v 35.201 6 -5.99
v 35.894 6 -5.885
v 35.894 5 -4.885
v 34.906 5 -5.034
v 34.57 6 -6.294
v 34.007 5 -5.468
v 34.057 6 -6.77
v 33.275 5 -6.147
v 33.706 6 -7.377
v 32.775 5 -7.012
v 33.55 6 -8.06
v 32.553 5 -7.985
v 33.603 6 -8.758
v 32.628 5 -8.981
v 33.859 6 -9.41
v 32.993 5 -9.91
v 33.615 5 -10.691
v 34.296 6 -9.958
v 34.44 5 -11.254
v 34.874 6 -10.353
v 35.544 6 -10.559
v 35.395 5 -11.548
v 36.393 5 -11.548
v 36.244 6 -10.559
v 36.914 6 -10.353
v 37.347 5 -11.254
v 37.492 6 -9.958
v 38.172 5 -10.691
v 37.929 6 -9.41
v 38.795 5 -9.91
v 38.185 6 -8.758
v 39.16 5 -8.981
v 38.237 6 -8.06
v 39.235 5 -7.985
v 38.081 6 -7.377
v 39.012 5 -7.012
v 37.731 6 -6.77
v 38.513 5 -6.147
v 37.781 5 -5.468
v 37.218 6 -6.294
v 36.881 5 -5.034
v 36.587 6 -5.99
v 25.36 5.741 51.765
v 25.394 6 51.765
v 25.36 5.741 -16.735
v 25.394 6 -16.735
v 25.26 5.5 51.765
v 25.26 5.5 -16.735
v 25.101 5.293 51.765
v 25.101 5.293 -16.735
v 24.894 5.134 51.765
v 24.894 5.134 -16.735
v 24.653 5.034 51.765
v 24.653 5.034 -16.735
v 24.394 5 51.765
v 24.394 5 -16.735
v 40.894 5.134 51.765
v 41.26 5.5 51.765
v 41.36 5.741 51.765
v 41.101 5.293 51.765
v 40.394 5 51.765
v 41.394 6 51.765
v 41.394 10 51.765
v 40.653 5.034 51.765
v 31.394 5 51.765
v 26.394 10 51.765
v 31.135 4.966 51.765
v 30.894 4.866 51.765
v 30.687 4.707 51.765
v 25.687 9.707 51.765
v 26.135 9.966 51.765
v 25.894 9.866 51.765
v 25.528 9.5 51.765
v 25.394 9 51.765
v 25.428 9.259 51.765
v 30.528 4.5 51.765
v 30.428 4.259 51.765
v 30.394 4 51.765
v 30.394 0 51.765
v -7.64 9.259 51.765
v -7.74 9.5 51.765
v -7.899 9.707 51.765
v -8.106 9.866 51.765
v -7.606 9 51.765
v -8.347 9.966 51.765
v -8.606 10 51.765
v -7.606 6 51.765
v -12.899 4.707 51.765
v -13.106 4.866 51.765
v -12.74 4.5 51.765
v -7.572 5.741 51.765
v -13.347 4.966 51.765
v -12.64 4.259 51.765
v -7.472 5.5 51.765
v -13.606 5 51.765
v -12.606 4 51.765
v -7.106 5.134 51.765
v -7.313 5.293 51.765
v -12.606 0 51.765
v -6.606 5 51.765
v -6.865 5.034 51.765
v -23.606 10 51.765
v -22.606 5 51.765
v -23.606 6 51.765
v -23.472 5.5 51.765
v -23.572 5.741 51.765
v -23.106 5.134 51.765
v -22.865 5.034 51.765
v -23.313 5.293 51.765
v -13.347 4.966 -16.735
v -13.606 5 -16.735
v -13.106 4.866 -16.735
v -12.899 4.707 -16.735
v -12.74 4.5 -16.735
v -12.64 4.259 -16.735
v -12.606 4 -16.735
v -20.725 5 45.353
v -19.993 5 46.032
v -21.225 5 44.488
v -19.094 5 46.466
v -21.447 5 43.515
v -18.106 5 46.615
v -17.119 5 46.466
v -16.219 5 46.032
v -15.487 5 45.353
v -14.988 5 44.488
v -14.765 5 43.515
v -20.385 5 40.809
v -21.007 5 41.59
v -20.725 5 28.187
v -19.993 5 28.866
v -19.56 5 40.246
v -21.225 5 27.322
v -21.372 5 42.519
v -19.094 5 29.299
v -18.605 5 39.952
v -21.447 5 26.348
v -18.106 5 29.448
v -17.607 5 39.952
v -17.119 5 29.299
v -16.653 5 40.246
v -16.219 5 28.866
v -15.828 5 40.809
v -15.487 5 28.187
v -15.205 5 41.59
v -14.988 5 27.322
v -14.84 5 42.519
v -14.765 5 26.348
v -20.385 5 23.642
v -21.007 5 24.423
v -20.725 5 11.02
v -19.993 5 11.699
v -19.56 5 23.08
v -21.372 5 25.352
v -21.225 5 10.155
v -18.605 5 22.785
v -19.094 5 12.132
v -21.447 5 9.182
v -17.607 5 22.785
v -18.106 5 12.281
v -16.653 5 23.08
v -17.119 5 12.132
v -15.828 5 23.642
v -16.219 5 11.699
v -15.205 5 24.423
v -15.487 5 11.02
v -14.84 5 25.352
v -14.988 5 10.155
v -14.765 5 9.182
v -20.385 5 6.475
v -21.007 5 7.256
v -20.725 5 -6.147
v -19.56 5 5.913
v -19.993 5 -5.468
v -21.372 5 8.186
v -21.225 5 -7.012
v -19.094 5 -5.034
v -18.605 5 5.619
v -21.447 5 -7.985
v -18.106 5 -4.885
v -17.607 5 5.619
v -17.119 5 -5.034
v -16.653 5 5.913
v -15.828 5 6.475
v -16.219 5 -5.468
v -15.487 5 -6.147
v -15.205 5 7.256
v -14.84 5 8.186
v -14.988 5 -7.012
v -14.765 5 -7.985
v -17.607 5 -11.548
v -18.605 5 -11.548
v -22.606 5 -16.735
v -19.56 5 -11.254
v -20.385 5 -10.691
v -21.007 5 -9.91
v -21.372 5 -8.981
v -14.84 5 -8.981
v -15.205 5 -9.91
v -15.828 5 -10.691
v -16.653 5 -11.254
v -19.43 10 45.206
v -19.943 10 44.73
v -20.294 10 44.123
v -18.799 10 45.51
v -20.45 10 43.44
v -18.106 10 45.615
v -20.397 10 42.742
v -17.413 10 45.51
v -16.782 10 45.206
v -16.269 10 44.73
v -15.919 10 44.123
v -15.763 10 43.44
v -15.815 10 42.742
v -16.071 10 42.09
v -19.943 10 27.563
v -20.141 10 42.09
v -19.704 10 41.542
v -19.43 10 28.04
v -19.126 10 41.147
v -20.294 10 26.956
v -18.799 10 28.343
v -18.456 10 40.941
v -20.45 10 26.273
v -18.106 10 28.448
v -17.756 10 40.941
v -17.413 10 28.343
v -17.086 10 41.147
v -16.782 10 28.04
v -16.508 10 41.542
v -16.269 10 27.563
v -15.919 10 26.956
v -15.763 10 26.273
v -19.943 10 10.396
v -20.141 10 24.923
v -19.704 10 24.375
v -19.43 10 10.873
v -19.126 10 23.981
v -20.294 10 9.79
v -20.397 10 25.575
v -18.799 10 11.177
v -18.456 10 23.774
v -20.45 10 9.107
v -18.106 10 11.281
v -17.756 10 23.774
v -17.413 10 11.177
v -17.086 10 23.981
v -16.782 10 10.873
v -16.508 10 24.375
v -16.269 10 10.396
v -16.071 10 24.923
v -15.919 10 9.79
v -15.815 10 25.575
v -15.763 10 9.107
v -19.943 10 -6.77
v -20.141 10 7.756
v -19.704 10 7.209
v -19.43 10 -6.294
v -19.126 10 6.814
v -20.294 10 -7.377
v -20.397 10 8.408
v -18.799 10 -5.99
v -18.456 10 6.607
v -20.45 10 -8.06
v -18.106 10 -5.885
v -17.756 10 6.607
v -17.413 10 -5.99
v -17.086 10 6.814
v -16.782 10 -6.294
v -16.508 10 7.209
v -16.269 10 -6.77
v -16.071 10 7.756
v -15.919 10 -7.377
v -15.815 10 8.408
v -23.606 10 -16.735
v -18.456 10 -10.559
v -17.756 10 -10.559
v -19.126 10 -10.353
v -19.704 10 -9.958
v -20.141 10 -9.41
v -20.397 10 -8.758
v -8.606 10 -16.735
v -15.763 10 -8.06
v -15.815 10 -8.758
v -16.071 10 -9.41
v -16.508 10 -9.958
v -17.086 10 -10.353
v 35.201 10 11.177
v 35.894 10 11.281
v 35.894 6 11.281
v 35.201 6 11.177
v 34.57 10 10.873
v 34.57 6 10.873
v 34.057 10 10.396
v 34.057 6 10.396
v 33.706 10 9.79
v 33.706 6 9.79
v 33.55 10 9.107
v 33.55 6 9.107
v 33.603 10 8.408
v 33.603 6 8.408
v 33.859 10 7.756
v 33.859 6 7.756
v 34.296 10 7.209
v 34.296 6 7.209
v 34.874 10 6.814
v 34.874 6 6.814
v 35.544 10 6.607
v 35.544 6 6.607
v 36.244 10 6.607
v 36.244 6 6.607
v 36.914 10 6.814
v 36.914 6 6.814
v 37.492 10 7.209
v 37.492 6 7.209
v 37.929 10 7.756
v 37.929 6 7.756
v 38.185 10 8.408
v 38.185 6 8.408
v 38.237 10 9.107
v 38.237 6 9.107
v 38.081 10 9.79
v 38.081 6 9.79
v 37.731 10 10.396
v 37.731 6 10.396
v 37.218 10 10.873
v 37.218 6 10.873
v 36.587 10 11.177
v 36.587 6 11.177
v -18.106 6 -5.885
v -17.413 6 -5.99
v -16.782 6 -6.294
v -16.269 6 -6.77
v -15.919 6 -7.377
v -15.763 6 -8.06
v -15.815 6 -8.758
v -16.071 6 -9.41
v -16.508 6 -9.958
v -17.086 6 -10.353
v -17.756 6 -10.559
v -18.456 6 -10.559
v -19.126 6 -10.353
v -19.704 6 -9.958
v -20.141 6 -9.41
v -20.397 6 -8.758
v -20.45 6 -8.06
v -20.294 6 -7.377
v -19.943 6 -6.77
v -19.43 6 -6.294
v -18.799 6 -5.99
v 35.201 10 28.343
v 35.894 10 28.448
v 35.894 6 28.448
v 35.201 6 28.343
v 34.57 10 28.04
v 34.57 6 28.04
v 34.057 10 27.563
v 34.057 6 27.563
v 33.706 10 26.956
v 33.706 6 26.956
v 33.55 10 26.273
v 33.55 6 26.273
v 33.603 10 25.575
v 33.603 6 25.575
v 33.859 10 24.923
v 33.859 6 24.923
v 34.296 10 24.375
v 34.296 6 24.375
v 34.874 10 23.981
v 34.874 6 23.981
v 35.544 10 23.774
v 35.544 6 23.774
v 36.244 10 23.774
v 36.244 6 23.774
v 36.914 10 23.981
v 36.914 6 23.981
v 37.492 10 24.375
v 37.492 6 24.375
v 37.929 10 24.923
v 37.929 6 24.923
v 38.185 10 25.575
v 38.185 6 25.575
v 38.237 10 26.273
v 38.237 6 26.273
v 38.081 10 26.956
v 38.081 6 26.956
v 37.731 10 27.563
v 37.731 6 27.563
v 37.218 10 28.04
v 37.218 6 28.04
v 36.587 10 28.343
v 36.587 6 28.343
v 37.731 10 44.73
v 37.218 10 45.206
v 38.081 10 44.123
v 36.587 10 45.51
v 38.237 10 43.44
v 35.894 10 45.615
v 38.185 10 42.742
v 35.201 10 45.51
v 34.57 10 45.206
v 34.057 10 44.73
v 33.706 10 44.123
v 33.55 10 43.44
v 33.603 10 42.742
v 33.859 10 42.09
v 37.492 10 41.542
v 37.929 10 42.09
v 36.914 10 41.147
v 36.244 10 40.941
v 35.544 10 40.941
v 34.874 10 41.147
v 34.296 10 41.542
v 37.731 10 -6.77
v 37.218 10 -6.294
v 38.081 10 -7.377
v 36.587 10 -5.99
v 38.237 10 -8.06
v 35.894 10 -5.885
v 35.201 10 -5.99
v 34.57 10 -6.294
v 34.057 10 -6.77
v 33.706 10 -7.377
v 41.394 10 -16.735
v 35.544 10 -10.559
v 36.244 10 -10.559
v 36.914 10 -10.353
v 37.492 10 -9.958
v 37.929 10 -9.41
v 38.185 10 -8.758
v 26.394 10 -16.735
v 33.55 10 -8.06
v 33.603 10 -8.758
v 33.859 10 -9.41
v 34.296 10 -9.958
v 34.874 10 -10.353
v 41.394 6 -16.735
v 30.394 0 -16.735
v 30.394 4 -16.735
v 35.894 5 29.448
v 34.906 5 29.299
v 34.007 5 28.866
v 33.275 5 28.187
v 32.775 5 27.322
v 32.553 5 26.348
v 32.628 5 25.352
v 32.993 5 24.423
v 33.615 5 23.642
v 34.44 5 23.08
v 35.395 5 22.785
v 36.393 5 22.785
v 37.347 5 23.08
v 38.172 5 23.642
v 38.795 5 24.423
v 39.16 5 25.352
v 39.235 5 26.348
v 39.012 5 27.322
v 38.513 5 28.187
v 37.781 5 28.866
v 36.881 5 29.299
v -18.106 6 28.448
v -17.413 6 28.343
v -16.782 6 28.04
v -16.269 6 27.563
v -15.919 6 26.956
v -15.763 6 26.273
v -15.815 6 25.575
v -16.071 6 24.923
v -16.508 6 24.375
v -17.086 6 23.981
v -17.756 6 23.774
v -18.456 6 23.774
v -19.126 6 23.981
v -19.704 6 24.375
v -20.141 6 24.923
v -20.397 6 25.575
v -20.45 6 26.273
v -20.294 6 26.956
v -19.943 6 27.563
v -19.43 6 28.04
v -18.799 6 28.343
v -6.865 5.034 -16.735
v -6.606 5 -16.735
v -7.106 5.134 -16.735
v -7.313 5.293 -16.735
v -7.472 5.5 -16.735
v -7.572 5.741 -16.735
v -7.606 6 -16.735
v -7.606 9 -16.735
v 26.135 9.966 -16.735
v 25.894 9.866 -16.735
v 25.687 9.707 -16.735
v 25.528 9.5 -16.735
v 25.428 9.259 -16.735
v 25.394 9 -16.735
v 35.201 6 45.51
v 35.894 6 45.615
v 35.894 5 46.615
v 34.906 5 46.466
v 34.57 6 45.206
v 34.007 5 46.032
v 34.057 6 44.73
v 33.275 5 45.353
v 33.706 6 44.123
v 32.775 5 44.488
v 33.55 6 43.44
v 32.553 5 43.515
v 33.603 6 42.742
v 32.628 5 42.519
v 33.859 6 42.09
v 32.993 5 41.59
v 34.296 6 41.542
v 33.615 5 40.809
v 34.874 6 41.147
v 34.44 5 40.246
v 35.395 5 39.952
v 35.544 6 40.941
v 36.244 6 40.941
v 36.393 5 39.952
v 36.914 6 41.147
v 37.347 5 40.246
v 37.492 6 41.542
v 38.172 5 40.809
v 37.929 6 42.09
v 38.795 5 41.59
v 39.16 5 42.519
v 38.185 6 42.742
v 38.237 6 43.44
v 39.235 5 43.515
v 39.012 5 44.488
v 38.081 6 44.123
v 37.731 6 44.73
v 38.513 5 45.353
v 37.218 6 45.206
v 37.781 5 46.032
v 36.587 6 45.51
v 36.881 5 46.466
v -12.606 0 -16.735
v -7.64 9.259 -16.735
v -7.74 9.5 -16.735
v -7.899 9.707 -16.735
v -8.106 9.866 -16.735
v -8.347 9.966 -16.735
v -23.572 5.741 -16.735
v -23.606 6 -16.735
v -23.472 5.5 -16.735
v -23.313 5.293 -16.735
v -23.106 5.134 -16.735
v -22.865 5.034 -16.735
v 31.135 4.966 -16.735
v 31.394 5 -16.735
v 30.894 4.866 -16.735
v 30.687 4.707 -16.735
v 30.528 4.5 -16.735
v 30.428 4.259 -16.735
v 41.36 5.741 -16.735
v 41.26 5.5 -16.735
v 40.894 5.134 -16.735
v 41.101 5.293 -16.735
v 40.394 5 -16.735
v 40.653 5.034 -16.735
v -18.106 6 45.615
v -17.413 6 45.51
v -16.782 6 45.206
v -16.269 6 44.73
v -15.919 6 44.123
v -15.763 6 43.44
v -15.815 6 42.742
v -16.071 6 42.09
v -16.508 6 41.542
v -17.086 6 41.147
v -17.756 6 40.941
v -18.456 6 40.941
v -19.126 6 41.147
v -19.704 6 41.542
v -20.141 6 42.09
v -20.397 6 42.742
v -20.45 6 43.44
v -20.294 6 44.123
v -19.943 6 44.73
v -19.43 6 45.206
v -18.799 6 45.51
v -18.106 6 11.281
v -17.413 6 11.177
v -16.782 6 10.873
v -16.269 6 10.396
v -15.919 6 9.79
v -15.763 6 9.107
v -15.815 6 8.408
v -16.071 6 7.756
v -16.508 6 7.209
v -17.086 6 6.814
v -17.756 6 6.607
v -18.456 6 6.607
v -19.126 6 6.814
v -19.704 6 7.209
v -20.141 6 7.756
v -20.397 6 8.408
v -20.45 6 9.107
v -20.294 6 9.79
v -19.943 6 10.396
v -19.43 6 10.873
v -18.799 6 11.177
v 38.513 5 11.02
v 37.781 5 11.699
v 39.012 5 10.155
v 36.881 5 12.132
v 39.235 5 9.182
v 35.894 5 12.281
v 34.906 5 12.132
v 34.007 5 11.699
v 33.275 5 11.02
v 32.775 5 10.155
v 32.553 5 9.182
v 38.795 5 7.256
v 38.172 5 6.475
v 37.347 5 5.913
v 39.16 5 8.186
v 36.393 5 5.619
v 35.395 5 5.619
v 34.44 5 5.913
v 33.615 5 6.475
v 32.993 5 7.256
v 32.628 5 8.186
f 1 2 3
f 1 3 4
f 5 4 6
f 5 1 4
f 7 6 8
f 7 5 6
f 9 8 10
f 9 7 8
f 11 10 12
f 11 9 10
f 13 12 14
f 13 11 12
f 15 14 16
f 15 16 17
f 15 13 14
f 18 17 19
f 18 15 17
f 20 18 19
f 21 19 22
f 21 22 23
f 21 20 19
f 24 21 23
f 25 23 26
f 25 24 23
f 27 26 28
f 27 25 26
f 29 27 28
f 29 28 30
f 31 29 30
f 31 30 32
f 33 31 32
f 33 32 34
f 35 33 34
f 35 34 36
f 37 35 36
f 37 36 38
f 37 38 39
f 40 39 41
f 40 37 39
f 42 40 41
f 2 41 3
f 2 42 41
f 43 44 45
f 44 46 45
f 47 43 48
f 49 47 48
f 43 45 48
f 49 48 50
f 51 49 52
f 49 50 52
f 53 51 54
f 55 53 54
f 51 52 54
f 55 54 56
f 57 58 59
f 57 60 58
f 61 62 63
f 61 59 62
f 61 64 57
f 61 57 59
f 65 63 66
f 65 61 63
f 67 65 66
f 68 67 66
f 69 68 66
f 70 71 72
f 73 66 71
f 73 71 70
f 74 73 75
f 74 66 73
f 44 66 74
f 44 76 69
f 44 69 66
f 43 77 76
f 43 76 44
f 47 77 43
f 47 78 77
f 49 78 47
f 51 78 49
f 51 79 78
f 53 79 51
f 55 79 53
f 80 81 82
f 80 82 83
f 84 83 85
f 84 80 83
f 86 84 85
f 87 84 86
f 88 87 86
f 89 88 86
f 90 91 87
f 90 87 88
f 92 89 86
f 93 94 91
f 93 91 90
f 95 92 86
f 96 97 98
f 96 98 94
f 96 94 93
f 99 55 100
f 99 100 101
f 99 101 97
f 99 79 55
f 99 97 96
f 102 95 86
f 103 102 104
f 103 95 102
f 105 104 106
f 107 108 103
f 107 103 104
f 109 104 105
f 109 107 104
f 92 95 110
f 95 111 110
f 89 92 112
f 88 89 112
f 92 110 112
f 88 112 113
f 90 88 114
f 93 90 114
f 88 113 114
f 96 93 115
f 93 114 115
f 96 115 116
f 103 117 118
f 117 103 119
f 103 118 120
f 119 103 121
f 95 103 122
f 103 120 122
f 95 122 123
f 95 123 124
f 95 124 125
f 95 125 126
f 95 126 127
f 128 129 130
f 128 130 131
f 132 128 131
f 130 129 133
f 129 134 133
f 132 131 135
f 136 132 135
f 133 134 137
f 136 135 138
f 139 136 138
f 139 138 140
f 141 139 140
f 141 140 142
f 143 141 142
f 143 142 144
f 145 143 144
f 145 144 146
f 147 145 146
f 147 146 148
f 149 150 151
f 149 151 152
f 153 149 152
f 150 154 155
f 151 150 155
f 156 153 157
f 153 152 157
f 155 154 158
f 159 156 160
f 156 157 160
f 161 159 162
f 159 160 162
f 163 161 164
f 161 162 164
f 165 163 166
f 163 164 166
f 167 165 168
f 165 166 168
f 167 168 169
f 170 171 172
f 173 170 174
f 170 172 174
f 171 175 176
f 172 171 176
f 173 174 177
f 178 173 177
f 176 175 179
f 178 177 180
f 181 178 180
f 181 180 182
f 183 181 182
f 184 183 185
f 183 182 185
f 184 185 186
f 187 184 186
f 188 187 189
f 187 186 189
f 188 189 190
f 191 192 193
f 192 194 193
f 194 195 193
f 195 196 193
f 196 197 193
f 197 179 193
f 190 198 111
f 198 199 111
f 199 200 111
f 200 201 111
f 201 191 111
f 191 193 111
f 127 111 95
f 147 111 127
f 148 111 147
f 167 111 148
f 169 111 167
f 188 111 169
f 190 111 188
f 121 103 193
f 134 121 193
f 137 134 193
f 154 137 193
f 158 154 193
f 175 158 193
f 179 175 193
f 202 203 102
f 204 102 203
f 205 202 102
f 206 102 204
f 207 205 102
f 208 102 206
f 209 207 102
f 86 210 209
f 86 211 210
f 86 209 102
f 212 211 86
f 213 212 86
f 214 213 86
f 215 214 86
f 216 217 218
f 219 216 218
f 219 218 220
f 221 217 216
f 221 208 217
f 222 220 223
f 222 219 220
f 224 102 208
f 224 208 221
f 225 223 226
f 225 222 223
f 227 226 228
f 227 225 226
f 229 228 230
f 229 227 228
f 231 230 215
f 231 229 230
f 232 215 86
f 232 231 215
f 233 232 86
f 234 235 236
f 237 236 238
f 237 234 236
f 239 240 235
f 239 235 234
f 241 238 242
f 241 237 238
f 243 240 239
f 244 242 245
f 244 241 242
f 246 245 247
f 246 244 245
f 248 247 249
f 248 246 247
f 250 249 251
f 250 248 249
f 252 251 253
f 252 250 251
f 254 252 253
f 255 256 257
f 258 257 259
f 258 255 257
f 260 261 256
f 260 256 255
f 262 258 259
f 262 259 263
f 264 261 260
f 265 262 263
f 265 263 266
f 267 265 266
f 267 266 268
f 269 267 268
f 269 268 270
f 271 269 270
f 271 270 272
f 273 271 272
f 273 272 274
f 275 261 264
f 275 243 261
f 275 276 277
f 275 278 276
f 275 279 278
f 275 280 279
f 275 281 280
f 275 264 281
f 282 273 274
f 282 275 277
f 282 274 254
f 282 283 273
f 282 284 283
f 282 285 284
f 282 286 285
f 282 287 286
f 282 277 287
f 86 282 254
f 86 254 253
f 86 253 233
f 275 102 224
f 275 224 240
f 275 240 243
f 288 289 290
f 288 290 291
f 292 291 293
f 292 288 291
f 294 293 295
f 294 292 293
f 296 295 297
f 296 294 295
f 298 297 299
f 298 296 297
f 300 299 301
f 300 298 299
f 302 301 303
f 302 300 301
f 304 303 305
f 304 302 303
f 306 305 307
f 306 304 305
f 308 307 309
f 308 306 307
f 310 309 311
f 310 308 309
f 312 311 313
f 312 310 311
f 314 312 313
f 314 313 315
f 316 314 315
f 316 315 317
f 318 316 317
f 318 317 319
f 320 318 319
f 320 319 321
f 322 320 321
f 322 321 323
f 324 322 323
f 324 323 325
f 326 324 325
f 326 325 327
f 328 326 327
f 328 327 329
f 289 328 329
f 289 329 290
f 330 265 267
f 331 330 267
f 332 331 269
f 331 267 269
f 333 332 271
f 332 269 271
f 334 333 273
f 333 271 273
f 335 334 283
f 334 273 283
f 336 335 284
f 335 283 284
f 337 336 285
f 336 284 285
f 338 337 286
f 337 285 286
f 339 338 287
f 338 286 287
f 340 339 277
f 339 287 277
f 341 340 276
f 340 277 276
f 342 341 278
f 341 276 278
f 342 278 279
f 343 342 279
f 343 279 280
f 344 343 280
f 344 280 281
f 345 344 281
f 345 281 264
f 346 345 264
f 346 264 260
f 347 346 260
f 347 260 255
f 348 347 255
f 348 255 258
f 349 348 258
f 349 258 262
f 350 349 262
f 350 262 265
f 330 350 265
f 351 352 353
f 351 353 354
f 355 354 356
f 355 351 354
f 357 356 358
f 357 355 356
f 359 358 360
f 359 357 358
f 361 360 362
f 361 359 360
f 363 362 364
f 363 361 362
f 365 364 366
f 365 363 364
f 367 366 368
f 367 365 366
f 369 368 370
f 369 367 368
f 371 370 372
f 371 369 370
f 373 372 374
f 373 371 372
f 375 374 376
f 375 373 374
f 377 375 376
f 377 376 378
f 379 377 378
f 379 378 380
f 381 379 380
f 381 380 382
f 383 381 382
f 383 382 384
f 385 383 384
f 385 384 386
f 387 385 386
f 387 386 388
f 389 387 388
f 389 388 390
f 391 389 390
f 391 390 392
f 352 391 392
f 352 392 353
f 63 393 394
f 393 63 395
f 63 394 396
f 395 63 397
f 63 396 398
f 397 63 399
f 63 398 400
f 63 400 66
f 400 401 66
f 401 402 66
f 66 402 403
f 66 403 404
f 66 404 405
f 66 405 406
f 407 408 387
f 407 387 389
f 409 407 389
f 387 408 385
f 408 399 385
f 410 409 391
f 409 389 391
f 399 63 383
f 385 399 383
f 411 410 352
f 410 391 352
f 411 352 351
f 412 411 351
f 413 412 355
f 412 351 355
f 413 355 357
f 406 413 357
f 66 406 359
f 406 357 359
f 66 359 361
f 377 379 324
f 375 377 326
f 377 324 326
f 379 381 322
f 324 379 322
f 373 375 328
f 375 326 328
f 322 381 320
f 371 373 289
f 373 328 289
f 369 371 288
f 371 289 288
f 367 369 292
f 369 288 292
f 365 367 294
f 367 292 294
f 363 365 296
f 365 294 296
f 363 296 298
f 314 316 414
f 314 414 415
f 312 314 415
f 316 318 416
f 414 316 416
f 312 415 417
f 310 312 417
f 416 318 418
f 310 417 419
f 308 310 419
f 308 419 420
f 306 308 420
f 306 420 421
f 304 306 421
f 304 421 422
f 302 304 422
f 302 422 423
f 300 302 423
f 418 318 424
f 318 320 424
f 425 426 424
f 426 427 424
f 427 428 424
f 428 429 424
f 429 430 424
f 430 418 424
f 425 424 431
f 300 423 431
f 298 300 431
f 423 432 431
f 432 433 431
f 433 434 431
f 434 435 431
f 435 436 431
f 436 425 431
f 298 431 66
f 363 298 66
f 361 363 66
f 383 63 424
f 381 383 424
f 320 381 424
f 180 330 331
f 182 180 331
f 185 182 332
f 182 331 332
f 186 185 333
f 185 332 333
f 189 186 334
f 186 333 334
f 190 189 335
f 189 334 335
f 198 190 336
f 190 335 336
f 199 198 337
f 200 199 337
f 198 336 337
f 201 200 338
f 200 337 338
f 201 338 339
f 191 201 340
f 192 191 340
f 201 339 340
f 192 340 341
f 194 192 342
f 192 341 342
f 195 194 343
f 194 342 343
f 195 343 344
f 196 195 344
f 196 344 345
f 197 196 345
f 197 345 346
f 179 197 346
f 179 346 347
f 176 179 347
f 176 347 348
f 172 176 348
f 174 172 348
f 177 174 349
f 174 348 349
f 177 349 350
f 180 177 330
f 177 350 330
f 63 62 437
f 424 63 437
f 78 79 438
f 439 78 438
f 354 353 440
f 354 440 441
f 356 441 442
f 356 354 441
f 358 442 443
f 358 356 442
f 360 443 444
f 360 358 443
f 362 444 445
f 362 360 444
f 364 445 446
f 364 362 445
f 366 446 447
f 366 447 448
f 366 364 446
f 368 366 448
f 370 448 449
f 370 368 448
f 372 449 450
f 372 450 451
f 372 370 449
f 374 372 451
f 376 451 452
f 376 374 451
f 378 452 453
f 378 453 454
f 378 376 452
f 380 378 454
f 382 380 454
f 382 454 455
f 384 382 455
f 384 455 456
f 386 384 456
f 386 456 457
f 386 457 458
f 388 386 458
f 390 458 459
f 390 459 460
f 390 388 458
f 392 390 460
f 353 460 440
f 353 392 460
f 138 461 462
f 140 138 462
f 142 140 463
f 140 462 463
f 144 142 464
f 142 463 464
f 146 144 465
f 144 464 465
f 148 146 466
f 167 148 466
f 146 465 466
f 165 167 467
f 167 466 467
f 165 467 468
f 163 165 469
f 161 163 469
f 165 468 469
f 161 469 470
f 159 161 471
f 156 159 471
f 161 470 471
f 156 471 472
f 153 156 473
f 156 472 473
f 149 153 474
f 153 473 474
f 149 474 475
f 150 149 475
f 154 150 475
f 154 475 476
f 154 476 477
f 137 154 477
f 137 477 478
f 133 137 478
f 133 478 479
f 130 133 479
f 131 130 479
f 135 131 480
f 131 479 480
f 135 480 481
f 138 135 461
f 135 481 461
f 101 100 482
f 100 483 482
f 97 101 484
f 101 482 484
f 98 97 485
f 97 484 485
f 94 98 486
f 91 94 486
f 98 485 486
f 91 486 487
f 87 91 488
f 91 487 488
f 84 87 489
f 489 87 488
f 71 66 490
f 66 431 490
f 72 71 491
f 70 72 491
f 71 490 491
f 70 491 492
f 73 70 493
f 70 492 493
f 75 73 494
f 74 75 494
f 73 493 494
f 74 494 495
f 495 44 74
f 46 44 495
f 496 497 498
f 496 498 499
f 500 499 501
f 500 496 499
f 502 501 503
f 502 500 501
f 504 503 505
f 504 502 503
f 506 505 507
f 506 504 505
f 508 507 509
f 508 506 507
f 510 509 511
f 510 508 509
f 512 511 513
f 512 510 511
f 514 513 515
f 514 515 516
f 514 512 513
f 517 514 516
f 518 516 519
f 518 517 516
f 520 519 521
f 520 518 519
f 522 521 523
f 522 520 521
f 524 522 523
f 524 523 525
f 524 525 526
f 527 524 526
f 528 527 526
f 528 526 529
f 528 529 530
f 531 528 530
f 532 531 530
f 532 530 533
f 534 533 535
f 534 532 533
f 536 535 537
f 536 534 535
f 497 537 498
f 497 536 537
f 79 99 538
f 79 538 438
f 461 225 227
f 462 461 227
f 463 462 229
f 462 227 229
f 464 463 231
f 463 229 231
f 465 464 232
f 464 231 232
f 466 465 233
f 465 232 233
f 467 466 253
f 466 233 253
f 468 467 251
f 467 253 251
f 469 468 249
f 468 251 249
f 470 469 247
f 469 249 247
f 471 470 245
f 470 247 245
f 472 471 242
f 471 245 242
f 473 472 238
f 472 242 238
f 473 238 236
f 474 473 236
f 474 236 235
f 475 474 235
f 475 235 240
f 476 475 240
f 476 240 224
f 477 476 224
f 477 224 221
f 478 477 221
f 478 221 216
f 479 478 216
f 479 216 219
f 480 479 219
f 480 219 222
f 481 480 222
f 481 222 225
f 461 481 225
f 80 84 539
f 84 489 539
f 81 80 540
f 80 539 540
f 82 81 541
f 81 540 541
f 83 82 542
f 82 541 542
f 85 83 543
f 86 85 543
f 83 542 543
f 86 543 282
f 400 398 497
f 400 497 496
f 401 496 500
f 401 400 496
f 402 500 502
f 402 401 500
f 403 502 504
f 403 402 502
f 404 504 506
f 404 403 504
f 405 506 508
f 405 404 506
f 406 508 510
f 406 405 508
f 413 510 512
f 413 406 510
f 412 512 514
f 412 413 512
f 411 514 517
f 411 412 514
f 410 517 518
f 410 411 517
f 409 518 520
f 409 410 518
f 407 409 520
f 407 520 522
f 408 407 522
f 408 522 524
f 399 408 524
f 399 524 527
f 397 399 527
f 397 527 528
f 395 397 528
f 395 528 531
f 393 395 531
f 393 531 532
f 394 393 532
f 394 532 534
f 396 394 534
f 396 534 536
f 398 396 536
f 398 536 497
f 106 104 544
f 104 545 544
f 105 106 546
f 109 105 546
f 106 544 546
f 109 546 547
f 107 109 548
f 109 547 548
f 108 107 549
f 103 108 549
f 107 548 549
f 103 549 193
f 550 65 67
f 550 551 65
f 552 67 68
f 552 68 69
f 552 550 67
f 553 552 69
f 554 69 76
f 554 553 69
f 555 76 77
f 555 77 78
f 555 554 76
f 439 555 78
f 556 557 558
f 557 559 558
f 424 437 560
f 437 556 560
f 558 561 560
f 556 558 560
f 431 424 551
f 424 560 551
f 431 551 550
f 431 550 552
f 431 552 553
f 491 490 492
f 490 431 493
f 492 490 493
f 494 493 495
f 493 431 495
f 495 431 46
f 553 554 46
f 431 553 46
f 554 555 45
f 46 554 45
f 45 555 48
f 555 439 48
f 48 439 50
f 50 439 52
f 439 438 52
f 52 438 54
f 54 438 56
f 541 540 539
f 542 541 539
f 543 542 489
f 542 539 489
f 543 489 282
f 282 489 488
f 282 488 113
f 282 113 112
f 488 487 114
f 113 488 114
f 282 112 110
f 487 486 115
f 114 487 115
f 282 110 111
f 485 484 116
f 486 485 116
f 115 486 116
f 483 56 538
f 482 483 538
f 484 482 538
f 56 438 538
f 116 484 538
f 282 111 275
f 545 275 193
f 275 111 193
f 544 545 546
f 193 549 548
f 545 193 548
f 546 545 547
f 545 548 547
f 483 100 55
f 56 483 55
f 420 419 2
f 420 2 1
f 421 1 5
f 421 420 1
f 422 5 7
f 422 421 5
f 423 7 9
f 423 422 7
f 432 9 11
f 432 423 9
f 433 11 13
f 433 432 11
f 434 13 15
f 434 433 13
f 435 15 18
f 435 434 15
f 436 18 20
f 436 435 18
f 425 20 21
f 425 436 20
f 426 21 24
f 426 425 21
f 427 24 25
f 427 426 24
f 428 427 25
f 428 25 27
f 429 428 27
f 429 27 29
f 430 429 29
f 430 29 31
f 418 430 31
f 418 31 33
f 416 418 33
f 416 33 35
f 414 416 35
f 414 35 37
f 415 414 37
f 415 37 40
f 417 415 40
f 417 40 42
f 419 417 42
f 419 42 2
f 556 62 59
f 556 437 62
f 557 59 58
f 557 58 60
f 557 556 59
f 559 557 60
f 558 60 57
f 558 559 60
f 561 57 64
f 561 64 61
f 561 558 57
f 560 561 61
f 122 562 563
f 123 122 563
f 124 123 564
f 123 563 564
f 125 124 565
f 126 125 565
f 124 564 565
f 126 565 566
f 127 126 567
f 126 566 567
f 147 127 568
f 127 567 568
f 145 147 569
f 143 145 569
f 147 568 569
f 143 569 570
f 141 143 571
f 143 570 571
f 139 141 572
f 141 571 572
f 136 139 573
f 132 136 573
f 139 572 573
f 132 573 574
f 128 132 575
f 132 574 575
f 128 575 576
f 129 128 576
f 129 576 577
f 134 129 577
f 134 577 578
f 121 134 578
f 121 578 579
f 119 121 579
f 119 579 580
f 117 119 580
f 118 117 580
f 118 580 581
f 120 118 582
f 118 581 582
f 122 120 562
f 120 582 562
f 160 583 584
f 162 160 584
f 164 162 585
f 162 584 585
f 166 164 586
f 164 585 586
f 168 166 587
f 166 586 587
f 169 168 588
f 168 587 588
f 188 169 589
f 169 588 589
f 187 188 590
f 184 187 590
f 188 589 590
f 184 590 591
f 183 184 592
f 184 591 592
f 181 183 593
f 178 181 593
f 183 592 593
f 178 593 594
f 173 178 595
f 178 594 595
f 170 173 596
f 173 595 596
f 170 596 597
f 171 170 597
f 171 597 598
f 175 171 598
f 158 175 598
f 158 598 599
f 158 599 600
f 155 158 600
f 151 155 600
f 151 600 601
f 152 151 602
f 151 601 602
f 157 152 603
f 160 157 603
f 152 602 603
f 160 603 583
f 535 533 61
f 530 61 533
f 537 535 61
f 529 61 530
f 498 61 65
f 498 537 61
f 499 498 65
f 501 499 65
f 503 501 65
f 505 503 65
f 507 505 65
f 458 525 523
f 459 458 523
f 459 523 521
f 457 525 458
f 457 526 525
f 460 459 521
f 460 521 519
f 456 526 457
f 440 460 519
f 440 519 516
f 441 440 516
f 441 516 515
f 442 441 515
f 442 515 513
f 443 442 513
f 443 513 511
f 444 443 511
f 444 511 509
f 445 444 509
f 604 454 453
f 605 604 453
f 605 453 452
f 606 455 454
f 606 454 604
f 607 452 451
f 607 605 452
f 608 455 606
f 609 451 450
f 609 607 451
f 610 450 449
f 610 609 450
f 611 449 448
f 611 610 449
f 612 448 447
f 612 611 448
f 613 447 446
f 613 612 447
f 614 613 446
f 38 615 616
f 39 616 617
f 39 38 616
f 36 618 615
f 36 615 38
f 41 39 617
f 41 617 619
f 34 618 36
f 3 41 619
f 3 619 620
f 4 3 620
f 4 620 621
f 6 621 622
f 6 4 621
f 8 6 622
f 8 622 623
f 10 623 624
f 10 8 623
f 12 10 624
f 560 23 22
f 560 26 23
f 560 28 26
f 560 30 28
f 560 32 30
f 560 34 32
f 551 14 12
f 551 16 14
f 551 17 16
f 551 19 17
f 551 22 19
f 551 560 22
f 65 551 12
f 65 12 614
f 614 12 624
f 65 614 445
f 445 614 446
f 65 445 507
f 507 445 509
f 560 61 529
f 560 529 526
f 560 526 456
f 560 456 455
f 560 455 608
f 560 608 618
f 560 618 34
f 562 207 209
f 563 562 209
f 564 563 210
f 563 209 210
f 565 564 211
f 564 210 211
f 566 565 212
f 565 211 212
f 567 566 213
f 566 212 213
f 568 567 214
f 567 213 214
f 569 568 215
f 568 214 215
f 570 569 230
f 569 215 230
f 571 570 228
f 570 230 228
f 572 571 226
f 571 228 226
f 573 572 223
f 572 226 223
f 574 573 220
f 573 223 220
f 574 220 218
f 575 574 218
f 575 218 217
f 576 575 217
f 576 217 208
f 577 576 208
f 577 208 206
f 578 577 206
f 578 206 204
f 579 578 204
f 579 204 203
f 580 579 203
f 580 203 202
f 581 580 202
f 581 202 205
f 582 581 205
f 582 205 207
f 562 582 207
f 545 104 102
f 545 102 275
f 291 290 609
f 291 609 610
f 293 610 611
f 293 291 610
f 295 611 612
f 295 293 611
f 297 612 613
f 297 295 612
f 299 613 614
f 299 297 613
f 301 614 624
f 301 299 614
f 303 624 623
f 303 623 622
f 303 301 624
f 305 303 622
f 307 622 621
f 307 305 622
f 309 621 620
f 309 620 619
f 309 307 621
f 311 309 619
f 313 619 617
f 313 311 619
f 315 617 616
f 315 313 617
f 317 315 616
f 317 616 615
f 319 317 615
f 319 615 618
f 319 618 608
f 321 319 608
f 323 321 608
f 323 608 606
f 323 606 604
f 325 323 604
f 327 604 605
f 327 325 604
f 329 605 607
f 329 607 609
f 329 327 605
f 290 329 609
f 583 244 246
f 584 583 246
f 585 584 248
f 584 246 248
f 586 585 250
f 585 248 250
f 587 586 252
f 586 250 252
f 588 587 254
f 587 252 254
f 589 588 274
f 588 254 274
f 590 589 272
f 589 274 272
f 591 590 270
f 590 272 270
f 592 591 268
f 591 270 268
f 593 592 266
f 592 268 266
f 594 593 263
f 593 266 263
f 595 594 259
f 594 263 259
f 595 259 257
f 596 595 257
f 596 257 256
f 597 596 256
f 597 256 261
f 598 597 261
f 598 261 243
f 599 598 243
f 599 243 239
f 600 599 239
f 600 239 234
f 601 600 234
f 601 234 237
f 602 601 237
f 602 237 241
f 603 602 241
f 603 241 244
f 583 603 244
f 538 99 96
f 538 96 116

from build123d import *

# Parameters (mm, degrees)
SKETCH1_W           = 43
SKETCH1_H           = 68.5
BOSS_EXTRUDE1_DEPTH = 5
SKETCH2_W           = 16
SKETCH2_H           = 68.5
BOSS_EXTRUDE2_DEPTH = 5
CUT_EXTRUDE1_REACH  = 62.855
SKETCH3_R           = 2.35
FILLET1_R           = 1
CHAMFER1_SIZE       = 1


with BuildPart() as part:
    # Sketch1 → Boss-Extrude1 (new body)
    with BuildSketch(Plane(origin=(0, 0, 0), x_dir=(1, 0, 0), z_dir=(0, 1, 0))):
        with Locations((8.893910561, -17.51450999)):
            Rectangle(SKETCH1_W, SKETCH1_H)
    extrude(amount=BOSS_EXTRUDE1_DEPTH)

    # Sketch2 → Boss-Extrude2 (add)
    with BuildSketch(Plane(origin=(0, 5, 0), x_dir=(1, 0, 0), z_dir=(0, 1, 0))):
        with Locations((-15.606089439, -17.51450999)):
            Rectangle(SKETCH2_W, SKETCH2_H)
    boss_extrude2 = extrude(amount=BOSS_EXTRUDE2_DEPTH)

    # Sketch3 → Cut-Extrude1 (cut, up to next)
    with BuildSketch(Plane(origin=(0, 10, 0), x_dir=(1, 0, 0), z_dir=(0, 1, 0)), mode=Mode.PRIVATE) as cut_extrude1_sk1:
        with Locations(Location((-18.106089439, 8.23549001, 0), (0, 0, 270))):
            Circle(SKETCH3_R)
    cut_extrude1_tool1 = extrude(cut_extrude1_sk1.sketch, amount=-CUT_EXTRUDE1_REACH, mode=Mode.PRIVATE) & part.part
    # Sketch3 → Cut-Extrude1 (cut, up to next)
    with BuildSketch(Plane(origin=(0, 10, 0), x_dir=(1, 0, 0), z_dir=(0, 1, 0)), mode=Mode.PRIVATE) as cut_extrude1_sk2:
        with Locations(Location((-18.106089439, -8.931176657, 0), (0, 0, 270))):
            Circle(SKETCH3_R)
    cut_extrude1_tool2 = extrude(cut_extrude1_sk2.sketch, amount=-CUT_EXTRUDE1_REACH, mode=Mode.PRIVATE) & part.part
    # Sketch3 → Cut-Extrude1 (cut, up to next)
    with BuildSketch(Plane(origin=(0, 10, 0), x_dir=(1, 0, 0), z_dir=(0, 1, 0)), mode=Mode.PRIVATE) as cut_extrude1_sk3:
        with Locations(Location((-18.106089439, -26.097843324, 0), (0, 0, 270))):
            Circle(SKETCH3_R)
    cut_extrude1_tool3 = extrude(cut_extrude1_sk3.sketch, amount=-CUT_EXTRUDE1_REACH, mode=Mode.PRIVATE) & part.part
    # Sketch3 → Cut-Extrude1 (cut, up to next)
    with BuildSketch(Plane(origin=(0, 10, 0), x_dir=(1, 0, 0), z_dir=(0, 1, 0)), mode=Mode.PRIVATE) as cut_extrude1_sk4:
        with Locations(Location((-18.106089439, -43.26450999, 0), (0, 0, 270))):
            Circle(SKETCH3_R)
    cut_extrude1_tool4 = extrude(cut_extrude1_sk4.sketch, amount=-CUT_EXTRUDE1_REACH, mode=Mode.PRIVATE) & part.part
    cut_extrude1_1 = cut_extrude1_tool1.solids().sort_by_distance((-18.106089, 10, -8.23549))[0]
    add(cut_extrude1_1, mode=Mode.SUBTRACT)
    cut_extrude1_2 = cut_extrude1_tool2.solids().sort_by_distance((-18.106089, 10, 8.931177))[0]
    add(cut_extrude1_2, mode=Mode.SUBTRACT)
    cut_extrude1_3 = cut_extrude1_tool3.solids().sort_by_distance((-18.106089, 10, 26.097843))[0]
    add(cut_extrude1_3, mode=Mode.SUBTRACT)
    cut_extrude1_4 = cut_extrude1_tool4.solids().sort_by_distance((-18.106089, 10, 43.26451))[0]
    add(cut_extrude1_4, mode=Mode.SUBTRACT)
    cut_extrude1 = cut_extrude1_1 + cut_extrude1_2 + cut_extrude1_3 + cut_extrude1_4  # Cut-Extrude1 as one shape, for the pattern or mirror that repeats it

    # Mirror1: Boss-Extrude2, Cut-Extrude1 across plane
    add(boss_extrude2.mirror(Plane(origin=(8.893910561, 0, 0), x_dir=(0, 0, 1), z_dir=(1, 0, 0))))
    add(cut_extrude1.mirror(Plane(origin=(8.893910561, 0, 0), x_dir=(0, 0, 1), z_dir=(1, 0, 0))), mode=Mode.SUBTRACT)

    # Fillet1
    fillet1_edges = [part.edges().sort_by_distance(p)[0] for p in [
        (30.393910561, 5, 17.51450999),
        (-7.606089439, 5, 17.51450999),
        (-23.606089439, 5, 17.51450999),
        (-7.606089439, 10, 17.51450999),
        (41.393910561, 5, 17.51450999),
        (25.393910561, 10, 17.51450999),
        (-12.606089439, 5, 17.51450999),
        (25.393910561, 5, 17.51450999),
    ]]
    fillet(fillet1_edges, radius=FILLET1_R)

    # Chamfer1
    chamfer1_edges = [part.edges().sort_by_distance(p)[0] for p in [
        (-18.106089439, 5, -10.58549001),
        (-18.106089439, 5, 6.581176657),
        (-18.106089439, 5, 23.747843324),
        (-18.106089439, 5, 40.91450999),
        (35.893910561, 5, -10.58549001),
        (35.893910561, 5, 6.581176657),
        (35.893910561, 5, 23.747843324),
        (35.893910561, 5, 40.91450999),
    ]]
    chamfer(chamfer1_edges, length=CHAMFER1_SIZE)


solid = part.part
